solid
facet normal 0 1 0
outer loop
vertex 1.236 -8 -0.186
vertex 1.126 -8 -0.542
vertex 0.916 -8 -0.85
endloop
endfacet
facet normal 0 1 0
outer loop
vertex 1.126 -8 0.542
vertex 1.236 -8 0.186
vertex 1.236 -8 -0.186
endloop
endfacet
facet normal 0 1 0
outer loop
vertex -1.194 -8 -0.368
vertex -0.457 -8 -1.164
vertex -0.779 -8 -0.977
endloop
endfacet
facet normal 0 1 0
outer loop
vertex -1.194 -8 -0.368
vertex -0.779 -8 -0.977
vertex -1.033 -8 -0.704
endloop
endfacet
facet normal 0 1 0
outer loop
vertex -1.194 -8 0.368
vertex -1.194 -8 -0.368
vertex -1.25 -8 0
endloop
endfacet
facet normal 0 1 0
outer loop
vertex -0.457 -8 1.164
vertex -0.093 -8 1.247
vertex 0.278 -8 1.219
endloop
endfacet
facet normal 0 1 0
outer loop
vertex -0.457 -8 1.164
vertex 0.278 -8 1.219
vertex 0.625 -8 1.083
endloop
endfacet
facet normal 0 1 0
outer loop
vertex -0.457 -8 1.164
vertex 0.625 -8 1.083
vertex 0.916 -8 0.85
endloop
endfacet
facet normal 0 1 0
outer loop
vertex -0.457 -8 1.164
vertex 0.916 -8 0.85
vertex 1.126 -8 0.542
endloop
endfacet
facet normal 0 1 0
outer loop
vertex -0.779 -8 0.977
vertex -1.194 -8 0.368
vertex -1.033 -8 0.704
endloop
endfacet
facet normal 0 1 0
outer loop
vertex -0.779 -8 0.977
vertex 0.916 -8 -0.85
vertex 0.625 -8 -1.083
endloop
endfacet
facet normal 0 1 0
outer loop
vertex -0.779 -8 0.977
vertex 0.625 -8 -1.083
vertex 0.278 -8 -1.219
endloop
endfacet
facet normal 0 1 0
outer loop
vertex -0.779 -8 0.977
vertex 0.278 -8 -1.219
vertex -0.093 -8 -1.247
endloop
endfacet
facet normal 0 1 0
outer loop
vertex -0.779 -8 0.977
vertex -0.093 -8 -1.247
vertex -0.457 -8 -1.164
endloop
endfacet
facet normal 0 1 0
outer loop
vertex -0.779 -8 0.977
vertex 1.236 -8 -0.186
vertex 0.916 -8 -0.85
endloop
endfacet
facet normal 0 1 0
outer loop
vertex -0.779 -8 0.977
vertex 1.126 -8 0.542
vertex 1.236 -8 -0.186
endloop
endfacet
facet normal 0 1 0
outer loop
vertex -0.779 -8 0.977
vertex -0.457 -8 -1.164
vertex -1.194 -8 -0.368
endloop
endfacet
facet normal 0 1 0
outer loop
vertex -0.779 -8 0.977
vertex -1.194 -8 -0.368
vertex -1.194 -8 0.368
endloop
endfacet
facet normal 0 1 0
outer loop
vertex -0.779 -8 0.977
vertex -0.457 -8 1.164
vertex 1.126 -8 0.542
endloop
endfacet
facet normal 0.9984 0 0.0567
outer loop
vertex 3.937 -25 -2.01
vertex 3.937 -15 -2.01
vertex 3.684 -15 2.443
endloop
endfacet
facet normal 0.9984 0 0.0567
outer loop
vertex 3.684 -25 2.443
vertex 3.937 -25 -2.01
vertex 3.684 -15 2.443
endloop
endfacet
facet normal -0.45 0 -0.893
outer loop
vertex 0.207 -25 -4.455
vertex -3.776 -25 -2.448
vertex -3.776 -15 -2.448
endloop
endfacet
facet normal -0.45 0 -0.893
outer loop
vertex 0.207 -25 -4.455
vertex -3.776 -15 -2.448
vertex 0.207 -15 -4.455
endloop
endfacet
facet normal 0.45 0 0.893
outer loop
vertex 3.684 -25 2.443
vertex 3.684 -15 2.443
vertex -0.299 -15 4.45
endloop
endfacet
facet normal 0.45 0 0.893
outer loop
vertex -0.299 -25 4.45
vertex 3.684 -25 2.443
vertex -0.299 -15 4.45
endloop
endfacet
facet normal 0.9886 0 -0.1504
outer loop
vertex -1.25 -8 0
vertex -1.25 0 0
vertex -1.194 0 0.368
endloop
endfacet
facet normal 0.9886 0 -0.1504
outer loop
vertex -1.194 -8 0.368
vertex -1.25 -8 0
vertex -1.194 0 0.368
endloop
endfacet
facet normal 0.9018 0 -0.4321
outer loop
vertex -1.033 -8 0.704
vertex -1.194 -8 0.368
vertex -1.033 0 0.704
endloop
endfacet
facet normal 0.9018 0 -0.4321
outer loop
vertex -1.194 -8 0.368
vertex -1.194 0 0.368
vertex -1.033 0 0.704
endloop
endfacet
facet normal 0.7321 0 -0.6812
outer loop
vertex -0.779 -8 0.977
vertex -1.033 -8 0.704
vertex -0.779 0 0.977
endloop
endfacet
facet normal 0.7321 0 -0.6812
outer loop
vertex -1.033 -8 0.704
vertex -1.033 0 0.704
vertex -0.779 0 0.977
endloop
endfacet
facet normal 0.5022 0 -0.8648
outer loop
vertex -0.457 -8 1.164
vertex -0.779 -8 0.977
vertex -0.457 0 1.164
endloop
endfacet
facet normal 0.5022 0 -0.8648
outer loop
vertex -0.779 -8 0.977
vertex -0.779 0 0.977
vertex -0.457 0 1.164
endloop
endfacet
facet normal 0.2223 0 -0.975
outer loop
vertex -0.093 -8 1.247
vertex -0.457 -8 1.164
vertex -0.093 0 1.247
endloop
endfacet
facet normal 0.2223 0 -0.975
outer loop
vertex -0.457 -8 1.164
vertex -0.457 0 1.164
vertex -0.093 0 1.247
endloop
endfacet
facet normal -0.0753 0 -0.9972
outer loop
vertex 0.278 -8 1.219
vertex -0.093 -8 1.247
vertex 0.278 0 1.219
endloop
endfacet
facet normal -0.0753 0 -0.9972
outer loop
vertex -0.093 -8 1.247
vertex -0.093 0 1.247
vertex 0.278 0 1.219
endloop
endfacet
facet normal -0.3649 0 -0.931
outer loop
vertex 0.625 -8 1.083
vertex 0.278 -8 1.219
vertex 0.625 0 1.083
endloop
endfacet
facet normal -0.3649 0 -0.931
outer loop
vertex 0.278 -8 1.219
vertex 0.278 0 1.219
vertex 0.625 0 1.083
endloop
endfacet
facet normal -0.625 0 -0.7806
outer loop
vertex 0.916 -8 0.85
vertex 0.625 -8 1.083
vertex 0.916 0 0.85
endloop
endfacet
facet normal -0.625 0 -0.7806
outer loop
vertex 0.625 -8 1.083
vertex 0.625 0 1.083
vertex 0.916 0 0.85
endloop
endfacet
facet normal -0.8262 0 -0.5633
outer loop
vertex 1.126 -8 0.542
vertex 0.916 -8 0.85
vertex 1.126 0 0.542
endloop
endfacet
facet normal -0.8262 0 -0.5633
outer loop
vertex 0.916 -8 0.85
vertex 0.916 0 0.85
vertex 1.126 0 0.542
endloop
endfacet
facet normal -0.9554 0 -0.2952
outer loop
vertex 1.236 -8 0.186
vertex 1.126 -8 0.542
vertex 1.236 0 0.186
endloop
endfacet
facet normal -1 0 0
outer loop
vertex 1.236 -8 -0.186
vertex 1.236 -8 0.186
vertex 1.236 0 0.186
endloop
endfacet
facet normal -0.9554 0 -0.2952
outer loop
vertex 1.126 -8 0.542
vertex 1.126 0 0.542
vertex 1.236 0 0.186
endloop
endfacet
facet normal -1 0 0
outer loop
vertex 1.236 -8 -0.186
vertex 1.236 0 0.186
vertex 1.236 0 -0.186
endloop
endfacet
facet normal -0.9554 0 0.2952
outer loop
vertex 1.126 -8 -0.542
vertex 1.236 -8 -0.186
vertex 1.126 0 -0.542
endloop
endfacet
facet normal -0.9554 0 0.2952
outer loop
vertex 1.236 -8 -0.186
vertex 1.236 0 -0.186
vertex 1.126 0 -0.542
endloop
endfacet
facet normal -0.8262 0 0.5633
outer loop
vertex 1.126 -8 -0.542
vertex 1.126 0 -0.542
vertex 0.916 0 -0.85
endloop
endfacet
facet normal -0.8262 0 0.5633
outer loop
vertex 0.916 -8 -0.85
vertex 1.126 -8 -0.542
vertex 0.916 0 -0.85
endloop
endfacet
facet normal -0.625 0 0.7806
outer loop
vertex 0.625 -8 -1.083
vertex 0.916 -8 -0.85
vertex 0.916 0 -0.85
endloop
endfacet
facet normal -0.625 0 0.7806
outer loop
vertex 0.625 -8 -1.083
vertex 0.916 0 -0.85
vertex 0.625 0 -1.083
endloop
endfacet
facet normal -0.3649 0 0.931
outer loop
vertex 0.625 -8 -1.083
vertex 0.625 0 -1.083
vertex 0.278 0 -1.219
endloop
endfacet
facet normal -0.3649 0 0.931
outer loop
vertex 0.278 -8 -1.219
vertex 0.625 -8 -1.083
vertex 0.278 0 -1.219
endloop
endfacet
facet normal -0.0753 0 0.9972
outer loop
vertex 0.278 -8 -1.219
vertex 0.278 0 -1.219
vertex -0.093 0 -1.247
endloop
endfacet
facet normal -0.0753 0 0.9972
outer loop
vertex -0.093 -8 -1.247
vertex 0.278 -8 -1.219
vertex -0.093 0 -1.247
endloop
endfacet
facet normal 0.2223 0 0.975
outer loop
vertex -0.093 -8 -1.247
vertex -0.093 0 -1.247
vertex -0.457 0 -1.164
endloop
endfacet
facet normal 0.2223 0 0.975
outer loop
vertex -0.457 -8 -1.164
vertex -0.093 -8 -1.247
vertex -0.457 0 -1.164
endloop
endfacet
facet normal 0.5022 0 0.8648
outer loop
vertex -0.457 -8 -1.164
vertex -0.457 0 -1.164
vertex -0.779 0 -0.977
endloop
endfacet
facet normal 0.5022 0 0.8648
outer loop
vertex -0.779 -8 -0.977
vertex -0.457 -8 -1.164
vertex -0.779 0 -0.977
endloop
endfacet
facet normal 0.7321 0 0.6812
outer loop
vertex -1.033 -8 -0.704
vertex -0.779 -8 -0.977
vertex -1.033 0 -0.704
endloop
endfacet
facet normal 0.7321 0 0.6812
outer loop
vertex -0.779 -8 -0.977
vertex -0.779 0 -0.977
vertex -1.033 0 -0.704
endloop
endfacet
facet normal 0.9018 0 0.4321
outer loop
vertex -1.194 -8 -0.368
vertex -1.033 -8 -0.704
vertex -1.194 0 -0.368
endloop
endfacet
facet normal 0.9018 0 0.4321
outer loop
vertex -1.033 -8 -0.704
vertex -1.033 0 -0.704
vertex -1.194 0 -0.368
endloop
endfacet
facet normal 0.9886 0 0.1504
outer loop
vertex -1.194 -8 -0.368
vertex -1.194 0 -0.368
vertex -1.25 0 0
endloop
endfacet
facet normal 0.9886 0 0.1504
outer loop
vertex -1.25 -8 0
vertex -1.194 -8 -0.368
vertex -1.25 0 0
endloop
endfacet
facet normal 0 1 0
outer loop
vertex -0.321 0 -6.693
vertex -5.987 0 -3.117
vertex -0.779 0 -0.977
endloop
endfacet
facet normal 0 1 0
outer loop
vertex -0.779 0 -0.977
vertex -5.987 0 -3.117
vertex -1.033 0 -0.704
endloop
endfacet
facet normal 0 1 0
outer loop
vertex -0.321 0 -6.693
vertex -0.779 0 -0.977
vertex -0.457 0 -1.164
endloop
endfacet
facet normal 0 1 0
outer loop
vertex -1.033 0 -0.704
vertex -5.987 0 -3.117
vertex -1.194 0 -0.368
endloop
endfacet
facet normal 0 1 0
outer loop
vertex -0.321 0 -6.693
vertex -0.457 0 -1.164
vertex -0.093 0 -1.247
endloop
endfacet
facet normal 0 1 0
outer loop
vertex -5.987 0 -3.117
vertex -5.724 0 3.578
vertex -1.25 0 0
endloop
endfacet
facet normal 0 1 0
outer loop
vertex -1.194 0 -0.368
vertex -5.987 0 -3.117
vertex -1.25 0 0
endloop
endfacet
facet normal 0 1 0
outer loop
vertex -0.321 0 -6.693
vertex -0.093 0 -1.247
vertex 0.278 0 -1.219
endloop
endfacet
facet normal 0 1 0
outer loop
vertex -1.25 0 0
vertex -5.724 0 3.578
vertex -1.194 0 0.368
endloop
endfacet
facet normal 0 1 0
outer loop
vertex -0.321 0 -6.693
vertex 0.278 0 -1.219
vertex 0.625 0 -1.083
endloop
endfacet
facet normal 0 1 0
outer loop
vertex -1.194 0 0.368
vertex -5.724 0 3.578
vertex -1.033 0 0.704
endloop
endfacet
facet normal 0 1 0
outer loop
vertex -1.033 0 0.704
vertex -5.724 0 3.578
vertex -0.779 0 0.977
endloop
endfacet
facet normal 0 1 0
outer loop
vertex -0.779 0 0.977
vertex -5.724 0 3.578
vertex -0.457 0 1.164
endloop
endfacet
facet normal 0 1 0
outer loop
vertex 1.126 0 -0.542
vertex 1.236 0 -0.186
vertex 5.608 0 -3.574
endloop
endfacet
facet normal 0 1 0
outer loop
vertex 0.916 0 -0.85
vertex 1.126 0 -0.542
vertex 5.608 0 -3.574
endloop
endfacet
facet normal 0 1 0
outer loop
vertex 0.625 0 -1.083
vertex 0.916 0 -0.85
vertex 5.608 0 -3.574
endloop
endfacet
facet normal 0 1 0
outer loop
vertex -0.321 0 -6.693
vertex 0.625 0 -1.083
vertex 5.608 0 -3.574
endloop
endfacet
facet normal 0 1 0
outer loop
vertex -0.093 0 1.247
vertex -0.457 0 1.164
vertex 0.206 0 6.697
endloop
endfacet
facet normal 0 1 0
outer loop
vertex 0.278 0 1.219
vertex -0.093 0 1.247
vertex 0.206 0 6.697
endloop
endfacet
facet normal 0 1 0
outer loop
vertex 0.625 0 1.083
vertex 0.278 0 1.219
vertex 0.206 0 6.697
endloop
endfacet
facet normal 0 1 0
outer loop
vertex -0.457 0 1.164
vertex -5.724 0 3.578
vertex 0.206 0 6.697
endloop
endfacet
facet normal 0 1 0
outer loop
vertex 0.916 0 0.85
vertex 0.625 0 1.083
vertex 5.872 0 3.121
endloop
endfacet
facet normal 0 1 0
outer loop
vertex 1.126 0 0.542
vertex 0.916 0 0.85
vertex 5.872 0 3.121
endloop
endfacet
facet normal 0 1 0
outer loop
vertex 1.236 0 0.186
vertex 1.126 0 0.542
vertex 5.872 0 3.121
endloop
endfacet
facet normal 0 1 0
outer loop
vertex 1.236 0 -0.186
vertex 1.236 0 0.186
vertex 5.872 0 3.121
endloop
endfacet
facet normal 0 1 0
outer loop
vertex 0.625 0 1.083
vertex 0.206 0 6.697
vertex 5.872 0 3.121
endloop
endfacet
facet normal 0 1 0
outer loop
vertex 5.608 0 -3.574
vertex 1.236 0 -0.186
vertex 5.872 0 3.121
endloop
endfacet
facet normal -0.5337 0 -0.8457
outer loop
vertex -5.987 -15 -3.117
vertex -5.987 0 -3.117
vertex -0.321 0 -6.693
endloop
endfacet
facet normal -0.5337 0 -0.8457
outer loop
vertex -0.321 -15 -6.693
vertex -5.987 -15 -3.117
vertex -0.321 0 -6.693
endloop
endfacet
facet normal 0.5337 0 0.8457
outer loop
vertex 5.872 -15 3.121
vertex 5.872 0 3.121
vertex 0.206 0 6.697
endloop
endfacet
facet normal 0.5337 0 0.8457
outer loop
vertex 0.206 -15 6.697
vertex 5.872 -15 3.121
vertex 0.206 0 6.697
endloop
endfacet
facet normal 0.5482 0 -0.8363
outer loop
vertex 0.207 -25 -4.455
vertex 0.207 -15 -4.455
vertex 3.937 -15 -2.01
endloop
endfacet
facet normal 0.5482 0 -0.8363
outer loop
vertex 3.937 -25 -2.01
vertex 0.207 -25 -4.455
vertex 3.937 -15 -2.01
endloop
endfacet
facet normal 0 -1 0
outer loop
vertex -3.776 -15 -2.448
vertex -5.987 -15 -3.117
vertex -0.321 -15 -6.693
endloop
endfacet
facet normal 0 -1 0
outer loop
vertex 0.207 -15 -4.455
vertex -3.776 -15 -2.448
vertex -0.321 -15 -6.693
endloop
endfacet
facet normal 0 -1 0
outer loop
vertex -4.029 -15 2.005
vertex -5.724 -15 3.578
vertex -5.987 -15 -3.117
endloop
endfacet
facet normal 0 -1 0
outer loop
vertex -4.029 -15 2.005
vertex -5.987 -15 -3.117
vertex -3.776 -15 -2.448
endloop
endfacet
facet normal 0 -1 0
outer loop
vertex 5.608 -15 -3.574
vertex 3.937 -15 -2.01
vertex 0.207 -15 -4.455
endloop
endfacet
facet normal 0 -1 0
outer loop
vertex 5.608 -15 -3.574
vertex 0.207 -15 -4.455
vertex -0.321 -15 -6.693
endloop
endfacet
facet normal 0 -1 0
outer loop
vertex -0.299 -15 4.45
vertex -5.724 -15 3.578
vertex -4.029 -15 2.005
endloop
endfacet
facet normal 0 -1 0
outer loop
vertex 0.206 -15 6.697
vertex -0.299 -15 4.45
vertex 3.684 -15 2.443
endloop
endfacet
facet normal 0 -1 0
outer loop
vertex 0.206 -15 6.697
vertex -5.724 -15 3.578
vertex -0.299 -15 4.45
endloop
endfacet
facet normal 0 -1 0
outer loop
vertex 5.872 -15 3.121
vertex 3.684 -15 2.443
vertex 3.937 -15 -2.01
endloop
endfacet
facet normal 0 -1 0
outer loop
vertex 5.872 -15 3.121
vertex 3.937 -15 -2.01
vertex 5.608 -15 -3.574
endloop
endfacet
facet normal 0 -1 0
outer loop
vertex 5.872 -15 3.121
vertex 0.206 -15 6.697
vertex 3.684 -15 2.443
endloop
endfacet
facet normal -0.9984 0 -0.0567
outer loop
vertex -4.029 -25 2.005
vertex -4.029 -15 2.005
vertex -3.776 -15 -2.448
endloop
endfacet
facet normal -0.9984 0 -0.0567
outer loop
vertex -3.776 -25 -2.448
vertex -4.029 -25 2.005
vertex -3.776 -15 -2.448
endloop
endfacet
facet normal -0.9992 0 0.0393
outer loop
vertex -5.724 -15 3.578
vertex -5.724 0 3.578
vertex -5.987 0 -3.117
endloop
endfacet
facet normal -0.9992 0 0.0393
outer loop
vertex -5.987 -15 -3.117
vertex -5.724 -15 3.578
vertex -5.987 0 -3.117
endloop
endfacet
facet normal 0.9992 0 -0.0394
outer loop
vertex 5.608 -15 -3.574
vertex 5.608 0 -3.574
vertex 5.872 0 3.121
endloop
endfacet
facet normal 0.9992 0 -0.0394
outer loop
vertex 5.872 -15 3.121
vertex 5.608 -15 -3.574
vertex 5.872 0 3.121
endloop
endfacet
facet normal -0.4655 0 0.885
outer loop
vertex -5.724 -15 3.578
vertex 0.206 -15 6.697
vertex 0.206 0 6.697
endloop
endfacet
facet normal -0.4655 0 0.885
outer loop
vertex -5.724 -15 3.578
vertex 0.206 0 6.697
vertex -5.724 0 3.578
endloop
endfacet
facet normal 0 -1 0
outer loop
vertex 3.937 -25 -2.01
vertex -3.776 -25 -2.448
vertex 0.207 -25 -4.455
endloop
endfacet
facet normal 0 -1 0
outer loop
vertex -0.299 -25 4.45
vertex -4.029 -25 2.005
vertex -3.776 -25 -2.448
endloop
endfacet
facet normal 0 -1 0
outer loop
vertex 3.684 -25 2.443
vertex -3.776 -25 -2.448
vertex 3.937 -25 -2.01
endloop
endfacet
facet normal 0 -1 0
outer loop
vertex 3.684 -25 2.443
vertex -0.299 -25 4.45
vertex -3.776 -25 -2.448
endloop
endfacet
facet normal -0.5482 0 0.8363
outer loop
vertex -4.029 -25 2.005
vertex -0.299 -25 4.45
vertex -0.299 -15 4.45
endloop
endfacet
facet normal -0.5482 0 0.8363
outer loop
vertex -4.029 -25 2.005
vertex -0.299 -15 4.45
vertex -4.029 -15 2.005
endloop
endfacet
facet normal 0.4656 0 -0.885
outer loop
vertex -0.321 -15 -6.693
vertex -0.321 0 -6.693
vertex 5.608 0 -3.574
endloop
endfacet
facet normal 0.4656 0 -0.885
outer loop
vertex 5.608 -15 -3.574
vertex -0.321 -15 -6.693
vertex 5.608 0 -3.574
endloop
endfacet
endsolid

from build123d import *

# Parameters (mm, degrees)
F1_DEPTH = 15
F3_DEPTH = 10
F4_R     = 1.25
F5_DEPTH = 8


# Not quite as in the source:
# - ends of sketch curves that miss each other by under 0.0002 mm in the source are joined


with BuildPart() as f1:
    # F0 (on Front) → F1 (new body)
    with BuildSketch(Plane.XZ):
        Polygon((-5.7235665096, 3.5781680242), (-5.9874106989, -3.1166349037), (-0.3214230722, -6.6925111543), (5.608370415, -3.5735600573), (5.8721762755, 3.1212672902), (0.2061886488, 6.6971435408), align=None)
    extrude(amount=F1_DEPTH)

    # F2 (on face) → F3 (join)
    with BuildSketch(Plane.XZ.offset(15)):
        Polygon((-4.0286979474, 2.0048922286), (-3.7759230982, -2.4479388793), (0.2067050986, -4.4554086614), (3.9365390256, -2.0100863602), (3.6837447559, 2.442705723), (-0.2988834409, 4.4501755052), align=None)
    extrude(amount=F3_DEPTH)

    # F4 (on face) → F5 (cut)
    with BuildSketch(Plane(origin=(0, 0, 0), x_dir=(-1, 0, 0), z_dir=(0, 1, 0))):
        Circle(F4_R)
    extrude(amount=-F5_DEPTH, mode=Mode.SUBTRACT)


solid = f1.part
